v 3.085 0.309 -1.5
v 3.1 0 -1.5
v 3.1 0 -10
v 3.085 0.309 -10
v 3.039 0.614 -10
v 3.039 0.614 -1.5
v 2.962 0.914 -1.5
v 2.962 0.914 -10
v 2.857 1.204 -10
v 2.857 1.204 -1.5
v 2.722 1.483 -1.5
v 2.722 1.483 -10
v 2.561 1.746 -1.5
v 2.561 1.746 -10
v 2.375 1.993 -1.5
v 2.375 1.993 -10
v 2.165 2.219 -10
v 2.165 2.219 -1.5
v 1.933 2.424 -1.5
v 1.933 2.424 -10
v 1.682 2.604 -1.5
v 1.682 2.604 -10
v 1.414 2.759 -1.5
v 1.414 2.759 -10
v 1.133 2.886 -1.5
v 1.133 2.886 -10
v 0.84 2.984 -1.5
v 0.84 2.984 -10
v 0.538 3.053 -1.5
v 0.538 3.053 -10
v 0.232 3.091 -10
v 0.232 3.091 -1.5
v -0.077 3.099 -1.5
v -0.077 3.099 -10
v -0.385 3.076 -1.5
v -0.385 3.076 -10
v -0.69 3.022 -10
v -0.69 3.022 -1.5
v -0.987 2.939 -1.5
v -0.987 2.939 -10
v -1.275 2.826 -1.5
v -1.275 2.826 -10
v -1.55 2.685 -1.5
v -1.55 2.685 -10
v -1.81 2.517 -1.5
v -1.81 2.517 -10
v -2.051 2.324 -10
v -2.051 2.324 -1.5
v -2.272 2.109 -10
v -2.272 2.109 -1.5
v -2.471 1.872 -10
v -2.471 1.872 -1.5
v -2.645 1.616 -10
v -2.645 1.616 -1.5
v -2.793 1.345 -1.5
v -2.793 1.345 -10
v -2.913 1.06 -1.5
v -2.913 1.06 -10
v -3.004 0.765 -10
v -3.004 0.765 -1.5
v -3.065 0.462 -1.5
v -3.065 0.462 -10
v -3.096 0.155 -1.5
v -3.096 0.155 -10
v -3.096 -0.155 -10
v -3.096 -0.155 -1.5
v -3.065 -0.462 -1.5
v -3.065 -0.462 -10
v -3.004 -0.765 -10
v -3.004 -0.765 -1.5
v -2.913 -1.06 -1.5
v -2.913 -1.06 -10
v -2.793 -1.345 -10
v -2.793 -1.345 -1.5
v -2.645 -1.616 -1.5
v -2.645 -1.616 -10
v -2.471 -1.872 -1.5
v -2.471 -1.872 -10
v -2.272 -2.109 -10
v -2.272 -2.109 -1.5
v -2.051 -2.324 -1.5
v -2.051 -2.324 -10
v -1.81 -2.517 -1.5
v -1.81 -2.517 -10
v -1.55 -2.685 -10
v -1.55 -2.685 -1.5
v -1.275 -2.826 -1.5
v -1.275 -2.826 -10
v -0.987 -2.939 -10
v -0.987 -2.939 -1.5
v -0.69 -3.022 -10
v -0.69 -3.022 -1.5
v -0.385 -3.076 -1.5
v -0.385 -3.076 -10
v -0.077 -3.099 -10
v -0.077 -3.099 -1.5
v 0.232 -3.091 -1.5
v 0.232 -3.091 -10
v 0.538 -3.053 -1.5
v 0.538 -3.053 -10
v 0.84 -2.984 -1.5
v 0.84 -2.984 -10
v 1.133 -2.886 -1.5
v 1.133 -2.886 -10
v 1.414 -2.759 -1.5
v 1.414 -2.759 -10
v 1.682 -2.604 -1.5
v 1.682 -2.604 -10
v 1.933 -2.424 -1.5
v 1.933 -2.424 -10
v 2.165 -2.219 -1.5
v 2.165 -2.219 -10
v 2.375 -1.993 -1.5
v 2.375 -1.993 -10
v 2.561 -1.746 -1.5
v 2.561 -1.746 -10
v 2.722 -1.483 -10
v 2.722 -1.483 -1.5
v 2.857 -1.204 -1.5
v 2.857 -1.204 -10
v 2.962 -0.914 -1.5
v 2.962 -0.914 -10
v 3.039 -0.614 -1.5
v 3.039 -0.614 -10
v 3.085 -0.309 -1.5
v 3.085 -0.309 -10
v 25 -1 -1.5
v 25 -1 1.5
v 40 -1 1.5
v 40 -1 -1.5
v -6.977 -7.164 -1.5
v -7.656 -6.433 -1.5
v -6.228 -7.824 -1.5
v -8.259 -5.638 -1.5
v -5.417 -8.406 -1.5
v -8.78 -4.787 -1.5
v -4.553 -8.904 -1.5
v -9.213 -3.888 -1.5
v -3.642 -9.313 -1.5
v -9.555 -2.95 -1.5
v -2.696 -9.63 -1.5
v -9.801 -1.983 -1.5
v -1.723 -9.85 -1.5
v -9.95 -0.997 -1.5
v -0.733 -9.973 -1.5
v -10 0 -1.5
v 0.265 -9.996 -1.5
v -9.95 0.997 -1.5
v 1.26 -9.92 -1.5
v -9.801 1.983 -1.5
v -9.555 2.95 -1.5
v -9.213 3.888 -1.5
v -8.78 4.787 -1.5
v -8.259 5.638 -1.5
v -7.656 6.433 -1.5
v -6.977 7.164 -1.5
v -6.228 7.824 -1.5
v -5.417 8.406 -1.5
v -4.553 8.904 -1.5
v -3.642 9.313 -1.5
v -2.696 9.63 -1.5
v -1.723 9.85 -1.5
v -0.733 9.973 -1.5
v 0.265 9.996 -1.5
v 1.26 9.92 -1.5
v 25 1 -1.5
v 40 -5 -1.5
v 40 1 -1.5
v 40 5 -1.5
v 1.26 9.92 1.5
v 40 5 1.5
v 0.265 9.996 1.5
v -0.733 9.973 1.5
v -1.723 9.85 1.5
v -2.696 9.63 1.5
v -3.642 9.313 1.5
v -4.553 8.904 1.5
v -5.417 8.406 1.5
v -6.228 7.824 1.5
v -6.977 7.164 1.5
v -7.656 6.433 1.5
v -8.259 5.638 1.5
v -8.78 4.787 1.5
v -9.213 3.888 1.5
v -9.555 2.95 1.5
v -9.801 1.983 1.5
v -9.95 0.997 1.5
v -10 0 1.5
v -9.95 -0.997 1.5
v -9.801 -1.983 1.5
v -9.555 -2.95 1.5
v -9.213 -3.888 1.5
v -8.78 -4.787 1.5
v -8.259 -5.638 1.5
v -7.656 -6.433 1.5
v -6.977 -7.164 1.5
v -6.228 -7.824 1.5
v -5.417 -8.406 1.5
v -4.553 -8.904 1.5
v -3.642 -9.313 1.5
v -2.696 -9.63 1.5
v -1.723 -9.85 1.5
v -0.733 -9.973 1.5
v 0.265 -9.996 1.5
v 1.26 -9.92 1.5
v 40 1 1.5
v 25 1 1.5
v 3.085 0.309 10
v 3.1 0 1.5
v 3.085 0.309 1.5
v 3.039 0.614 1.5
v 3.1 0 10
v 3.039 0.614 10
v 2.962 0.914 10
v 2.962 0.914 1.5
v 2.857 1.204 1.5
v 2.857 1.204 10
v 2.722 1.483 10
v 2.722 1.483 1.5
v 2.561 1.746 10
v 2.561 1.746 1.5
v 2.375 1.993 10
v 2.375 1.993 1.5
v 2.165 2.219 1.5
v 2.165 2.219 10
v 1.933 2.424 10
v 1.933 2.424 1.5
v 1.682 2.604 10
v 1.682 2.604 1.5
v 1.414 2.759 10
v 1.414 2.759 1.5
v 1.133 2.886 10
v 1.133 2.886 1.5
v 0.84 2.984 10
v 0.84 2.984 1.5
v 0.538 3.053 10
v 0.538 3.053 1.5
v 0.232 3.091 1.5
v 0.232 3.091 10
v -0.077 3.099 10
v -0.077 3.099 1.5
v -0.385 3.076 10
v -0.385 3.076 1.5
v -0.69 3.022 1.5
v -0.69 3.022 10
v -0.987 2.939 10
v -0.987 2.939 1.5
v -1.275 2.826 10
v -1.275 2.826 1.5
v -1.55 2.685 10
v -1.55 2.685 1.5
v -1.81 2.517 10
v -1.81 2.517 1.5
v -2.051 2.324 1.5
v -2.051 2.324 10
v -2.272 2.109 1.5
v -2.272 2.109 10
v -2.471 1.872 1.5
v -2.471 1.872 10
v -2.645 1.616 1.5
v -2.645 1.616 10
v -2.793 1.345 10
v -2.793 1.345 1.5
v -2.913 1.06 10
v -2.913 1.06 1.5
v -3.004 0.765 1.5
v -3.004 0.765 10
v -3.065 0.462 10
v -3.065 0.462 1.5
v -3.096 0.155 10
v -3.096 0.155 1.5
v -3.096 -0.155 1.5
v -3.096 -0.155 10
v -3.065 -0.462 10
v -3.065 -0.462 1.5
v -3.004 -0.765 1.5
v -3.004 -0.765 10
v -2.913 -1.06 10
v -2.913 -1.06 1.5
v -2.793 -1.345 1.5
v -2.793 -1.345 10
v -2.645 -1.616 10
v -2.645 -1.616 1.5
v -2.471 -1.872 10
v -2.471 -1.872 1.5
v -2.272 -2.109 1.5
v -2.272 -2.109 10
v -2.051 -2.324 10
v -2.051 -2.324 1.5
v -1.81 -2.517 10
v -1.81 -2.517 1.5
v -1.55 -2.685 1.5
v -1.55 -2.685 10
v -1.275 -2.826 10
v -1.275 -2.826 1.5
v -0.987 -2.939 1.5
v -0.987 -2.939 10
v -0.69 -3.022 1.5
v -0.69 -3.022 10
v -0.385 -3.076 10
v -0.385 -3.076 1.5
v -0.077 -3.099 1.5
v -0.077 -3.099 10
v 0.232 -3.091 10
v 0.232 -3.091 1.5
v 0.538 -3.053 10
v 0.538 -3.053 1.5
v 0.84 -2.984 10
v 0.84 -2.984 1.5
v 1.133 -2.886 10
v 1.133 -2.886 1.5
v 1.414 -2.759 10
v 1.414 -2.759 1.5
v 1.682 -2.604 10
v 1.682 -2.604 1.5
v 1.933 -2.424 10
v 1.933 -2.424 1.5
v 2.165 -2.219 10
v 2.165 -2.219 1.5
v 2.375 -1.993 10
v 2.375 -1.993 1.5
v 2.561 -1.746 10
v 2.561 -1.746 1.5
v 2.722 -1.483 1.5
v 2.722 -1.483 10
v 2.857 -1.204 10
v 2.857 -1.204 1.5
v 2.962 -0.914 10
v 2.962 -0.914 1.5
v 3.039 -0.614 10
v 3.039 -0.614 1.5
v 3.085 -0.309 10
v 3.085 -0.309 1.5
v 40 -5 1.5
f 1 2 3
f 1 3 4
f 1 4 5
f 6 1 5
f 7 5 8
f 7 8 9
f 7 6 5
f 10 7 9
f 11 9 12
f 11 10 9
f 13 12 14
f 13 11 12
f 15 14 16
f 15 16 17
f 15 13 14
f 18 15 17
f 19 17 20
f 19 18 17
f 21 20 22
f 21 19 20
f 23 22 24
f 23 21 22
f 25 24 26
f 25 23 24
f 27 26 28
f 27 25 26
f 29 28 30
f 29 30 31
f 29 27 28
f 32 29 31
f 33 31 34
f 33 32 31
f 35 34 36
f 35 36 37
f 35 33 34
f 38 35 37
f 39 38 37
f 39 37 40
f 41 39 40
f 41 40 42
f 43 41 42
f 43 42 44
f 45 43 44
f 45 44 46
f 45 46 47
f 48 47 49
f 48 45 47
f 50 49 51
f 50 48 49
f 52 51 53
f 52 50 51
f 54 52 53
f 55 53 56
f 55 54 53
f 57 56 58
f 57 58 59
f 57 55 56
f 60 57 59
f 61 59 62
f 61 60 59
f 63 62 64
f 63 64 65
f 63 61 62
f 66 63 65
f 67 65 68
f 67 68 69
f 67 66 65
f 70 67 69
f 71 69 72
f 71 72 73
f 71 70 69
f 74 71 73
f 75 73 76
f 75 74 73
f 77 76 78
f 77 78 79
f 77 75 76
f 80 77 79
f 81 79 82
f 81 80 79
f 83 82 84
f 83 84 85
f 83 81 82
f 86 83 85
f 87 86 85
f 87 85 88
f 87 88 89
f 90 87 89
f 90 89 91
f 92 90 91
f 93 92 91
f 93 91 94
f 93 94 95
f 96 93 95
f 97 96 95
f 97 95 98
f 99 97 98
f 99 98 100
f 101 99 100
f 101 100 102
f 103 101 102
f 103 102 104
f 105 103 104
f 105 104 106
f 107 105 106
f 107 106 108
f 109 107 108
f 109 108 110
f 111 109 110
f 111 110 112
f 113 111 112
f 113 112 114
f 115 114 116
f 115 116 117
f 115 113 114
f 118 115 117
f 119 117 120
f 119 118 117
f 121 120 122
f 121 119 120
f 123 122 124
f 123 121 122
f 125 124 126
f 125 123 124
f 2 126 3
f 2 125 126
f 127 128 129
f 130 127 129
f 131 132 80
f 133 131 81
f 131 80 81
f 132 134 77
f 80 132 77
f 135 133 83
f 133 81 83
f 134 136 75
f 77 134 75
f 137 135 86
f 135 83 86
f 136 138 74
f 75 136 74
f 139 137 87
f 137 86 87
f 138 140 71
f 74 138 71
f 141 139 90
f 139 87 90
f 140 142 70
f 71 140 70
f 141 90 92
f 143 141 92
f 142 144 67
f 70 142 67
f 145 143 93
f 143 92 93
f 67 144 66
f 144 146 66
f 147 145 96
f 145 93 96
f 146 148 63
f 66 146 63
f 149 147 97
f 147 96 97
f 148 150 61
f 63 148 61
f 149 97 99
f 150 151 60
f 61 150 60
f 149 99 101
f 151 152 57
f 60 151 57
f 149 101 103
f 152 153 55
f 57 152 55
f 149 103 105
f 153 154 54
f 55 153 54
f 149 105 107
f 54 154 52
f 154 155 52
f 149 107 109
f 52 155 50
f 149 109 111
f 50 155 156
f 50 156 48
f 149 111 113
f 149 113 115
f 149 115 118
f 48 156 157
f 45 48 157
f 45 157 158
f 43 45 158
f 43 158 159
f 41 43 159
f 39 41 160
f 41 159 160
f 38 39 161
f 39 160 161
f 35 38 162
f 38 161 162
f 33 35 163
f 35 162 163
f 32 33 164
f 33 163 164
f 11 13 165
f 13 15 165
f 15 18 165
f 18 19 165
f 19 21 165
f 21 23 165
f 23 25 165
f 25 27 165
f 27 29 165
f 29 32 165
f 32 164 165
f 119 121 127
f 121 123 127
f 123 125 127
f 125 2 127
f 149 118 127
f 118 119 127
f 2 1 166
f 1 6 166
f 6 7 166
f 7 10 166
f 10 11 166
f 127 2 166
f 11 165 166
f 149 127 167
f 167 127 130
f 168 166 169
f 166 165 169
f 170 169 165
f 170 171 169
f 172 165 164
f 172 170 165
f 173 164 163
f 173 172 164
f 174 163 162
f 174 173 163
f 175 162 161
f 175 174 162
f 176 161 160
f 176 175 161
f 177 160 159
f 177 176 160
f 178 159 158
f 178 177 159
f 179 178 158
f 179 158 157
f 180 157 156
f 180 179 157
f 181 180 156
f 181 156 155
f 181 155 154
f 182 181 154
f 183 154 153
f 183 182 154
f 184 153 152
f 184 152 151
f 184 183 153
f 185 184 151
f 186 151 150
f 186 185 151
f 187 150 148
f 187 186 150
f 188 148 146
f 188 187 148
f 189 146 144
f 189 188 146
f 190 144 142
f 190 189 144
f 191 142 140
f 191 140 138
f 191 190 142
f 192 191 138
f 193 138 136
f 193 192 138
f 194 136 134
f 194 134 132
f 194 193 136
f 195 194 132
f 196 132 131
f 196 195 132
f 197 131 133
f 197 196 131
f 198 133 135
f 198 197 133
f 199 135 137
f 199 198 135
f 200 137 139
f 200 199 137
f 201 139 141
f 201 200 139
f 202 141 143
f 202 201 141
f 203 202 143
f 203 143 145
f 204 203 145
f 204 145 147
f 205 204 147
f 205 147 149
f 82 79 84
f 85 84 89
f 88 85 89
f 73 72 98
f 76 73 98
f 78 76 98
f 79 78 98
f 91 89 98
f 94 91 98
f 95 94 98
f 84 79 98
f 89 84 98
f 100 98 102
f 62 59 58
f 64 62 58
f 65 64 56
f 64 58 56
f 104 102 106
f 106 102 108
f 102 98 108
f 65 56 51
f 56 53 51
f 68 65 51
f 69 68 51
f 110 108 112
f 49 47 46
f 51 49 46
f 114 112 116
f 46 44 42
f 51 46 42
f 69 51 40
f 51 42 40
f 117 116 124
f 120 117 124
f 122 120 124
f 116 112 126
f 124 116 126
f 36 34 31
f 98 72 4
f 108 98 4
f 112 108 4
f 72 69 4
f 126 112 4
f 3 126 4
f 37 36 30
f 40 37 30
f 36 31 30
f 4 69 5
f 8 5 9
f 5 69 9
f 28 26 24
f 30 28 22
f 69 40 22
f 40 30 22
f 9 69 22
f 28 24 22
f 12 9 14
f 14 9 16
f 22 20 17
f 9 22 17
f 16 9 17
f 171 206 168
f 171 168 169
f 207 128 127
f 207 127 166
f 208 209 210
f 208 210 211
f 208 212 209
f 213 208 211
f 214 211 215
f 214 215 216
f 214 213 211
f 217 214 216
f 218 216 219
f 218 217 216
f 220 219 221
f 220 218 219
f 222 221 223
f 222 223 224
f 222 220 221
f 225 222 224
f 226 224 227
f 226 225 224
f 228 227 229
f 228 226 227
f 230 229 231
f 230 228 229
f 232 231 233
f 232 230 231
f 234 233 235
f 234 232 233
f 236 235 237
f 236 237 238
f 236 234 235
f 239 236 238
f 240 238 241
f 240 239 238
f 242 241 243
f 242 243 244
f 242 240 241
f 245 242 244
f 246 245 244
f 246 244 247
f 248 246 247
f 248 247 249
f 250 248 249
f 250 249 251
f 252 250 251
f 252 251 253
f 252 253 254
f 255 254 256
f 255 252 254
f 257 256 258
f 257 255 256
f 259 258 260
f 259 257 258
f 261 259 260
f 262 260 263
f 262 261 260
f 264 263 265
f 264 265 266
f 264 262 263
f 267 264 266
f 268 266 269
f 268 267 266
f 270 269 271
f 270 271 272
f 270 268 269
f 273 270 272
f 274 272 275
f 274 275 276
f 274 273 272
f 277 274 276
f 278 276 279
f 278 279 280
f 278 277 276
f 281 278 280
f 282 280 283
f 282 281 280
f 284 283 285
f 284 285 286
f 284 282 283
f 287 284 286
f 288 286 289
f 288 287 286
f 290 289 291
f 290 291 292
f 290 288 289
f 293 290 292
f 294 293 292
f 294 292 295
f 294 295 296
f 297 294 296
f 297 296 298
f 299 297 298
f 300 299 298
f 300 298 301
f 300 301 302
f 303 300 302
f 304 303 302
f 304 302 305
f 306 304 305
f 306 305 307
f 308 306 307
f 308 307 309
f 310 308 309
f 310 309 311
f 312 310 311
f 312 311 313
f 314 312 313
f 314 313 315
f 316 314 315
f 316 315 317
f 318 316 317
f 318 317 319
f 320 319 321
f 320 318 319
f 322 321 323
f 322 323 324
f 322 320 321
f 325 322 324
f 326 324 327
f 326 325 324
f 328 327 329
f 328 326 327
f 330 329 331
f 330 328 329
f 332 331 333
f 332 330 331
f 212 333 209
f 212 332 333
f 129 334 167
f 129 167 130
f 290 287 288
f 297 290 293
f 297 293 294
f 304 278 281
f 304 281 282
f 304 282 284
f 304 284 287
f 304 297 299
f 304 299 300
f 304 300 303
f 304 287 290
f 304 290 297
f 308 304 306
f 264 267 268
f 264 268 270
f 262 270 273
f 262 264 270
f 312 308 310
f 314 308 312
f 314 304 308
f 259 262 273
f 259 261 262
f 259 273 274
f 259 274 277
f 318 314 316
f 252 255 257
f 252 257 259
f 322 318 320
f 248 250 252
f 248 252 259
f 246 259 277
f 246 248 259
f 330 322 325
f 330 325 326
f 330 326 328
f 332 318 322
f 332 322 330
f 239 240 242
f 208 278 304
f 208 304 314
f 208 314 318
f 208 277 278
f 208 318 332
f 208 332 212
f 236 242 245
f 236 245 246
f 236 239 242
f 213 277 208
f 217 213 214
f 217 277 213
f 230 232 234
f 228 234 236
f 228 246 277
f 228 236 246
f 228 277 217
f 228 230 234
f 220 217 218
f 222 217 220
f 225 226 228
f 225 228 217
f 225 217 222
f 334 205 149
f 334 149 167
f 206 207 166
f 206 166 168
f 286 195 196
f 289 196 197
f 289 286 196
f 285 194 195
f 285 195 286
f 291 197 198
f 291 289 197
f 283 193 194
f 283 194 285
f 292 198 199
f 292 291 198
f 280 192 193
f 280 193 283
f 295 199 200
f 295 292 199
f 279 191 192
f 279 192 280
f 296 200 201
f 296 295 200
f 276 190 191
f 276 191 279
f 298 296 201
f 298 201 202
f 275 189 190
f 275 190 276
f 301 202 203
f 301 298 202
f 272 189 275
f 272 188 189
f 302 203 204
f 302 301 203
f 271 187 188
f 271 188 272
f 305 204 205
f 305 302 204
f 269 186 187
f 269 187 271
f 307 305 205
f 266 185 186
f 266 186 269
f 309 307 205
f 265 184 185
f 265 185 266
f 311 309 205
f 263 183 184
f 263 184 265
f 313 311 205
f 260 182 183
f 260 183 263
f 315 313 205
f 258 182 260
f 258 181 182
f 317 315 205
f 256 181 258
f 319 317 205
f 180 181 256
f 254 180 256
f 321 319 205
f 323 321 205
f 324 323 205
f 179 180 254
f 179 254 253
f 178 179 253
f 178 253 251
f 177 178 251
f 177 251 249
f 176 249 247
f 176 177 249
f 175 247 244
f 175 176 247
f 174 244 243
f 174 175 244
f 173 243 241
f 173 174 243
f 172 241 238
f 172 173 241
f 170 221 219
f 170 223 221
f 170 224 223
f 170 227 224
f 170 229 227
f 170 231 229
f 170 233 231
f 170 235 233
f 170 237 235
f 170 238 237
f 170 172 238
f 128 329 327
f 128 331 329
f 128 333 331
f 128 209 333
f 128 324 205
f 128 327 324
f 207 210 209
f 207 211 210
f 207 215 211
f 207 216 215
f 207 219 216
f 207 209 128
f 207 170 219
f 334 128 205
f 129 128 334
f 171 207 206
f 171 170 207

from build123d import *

# Parameters (mm, degrees)
F0_R     = 3.1
F1_DEPTH = 10
F2_DEPTH = 1.5
F3_W     = 15
F3_H     = 2
F4_DEPTH = 11.501


# Not quite as in the source:
# - a feature names something its author has since deleted; it is built from what else it names


with BuildPart() as f1:
    # F0 (on Top) → F1 (new body, symmetric)
    with BuildSketch(Plane.XY):
        Circle(F0_R)
    extrude(amount=F1_DEPTH, both=True)

    # F0 (on Top) → F2 (join, symmetric)
    with BuildSketch(Plane.XY):
        with BuildLine():
            ThreePointArc((1.2599617485, -9.9203072731), (7.5033198481, -6.6106120184), (10, 0))
            ThreePointArc((10, 0), (7.503319686, 6.6106122023), (1.2599612621, 9.9203073349))
            ThreePointArc((1.2599612621, 9.9203073349), (-10, -2.451e-07), (1.2599617485, -9.9203072731))
        make_face()
        Circle(F0_R, mode=Mode.SUBTRACT)
        with BuildLine():
            ThreePointArc((1.2599612621, 9.9203073349), (7.503319686, 6.6106122023), (10, 0))
            ThreePointArc((10, 0), (7.5033198481, -6.6106120184), (1.2599617485, -9.9203072731))
            Line((1.2599617485, -9.9203072731), (40, -5))
            Line((40, -5), (40, 5))
            Line((40, 5), (1.2599612621, 9.9203073349))
        make_face()
    extrude(amount=F2_DEPTH, both=True)

    # F3 (on face) → F4 (cut, through all)
    with BuildSketch(Plane.XY.offset(1.5)):
        with Locations((32.5, 0)):
            Rectangle(F3_W, F3_H)
    extrude(amount=-F4_DEPTH, mode=Mode.SUBTRACT)


solid = f1.part
